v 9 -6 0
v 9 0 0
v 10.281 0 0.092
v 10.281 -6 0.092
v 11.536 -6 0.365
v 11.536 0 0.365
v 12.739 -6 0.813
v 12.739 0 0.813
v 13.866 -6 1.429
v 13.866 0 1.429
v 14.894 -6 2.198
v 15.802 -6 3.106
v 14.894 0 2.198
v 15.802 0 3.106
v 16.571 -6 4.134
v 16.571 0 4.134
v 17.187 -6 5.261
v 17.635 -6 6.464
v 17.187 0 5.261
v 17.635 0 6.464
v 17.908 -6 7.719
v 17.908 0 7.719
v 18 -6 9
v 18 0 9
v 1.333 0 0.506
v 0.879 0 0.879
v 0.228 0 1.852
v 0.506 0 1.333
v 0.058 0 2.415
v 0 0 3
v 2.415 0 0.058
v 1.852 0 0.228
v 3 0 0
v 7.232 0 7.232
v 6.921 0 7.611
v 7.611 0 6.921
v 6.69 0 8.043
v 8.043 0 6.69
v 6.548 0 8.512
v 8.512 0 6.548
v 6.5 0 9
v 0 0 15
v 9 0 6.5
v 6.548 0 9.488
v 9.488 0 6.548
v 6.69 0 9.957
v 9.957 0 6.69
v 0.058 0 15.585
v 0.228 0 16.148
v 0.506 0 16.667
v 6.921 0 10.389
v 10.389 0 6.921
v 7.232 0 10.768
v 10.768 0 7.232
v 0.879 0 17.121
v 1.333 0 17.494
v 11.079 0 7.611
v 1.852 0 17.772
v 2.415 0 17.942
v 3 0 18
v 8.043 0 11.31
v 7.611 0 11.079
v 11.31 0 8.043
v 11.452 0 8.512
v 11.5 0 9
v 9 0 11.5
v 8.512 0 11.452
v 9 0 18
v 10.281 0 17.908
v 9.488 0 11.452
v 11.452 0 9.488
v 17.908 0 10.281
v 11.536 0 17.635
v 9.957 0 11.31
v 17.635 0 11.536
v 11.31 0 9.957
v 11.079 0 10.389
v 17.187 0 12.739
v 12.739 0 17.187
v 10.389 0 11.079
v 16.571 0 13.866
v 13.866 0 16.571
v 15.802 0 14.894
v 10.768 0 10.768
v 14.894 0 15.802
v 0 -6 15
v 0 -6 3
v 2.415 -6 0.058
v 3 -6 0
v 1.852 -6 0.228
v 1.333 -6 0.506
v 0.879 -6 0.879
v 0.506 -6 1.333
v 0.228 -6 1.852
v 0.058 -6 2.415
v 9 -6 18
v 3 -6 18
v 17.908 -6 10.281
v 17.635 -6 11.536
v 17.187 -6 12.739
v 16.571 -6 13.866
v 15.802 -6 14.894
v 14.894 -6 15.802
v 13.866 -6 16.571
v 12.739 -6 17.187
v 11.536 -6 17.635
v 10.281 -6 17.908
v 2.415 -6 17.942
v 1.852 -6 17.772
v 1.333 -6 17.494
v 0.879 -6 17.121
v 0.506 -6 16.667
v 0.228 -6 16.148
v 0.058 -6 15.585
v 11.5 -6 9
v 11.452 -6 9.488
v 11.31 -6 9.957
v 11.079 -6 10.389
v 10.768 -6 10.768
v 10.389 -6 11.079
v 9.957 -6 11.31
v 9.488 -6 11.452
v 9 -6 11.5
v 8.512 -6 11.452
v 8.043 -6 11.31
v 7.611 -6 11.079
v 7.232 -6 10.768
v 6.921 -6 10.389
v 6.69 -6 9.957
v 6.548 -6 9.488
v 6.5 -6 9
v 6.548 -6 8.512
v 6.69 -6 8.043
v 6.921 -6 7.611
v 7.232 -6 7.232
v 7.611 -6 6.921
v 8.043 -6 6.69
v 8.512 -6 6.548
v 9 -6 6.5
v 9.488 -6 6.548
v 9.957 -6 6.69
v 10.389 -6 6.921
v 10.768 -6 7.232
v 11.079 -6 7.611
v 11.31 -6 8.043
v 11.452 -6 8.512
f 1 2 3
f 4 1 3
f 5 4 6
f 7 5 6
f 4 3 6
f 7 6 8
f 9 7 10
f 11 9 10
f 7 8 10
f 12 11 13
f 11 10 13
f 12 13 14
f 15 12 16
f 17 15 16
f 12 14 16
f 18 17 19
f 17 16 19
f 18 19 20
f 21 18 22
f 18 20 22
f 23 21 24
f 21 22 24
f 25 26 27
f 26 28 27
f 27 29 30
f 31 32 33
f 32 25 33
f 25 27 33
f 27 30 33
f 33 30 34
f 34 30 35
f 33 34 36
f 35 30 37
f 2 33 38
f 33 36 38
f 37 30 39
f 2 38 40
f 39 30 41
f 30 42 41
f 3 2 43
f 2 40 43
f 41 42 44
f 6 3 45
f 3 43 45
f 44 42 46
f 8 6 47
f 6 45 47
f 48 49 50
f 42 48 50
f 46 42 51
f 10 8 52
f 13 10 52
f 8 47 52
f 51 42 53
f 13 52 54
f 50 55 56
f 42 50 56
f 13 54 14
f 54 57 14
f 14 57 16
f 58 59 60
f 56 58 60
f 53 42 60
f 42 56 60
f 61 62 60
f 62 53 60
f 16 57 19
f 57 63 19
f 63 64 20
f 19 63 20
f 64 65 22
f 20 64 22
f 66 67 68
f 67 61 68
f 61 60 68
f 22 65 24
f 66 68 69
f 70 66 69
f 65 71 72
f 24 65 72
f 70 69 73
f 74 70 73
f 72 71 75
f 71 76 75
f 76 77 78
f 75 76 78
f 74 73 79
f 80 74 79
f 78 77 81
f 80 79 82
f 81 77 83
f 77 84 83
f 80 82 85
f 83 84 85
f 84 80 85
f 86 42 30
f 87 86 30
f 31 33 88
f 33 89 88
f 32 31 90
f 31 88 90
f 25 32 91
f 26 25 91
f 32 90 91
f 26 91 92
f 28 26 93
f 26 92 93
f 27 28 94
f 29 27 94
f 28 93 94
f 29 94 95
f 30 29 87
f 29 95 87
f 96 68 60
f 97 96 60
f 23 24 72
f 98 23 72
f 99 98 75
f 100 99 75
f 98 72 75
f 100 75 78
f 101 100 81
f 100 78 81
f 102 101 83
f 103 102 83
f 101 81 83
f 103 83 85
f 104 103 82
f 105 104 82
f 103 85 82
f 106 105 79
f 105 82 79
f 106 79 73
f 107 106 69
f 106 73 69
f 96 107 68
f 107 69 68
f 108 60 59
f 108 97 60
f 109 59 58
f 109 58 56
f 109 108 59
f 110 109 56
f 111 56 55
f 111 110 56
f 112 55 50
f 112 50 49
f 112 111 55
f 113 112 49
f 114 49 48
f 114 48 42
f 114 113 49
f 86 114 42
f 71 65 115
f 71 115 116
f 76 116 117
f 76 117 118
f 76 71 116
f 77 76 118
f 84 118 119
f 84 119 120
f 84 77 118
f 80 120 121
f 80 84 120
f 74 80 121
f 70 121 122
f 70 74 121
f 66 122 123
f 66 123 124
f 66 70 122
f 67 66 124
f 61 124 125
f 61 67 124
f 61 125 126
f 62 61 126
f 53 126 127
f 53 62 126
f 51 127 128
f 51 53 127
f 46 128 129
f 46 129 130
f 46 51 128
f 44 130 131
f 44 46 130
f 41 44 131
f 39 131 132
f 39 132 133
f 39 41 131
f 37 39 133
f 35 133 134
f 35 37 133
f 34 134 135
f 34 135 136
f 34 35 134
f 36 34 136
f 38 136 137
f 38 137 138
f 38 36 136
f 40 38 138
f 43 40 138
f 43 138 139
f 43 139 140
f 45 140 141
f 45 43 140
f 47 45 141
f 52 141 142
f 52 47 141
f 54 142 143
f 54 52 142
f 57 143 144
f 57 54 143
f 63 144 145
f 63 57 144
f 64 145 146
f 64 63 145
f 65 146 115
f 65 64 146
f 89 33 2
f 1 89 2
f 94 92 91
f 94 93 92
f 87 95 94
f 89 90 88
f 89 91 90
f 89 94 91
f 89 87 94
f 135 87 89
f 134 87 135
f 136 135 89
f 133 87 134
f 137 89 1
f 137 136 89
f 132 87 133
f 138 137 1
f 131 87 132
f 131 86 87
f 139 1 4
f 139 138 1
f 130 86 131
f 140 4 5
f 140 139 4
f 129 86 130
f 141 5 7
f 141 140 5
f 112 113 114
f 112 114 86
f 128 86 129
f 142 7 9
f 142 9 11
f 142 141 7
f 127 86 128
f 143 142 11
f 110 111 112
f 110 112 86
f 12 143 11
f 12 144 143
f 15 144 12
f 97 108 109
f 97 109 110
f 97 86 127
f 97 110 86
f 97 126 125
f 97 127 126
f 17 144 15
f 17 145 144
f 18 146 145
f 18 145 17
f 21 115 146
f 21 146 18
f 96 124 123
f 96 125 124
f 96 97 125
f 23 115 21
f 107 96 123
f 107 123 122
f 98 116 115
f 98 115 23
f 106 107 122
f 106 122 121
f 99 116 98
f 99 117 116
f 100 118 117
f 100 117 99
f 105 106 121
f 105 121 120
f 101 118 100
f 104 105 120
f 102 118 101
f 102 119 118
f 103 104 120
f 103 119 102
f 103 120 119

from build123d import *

# Parameters (mm, degrees)
F0_R     = 2.5
F1_DEPTH = 6
F2_R     = 3


with BuildPart() as f1:
    # F0 (on Front) → F1 (new body)
    with BuildSketch(Plane.XZ):
        with BuildLine():
            Line((0, 9), (0, 0))
            Line((0, 0), (9, 0))
            ThreePointArc((9, 0), (2.6360389693, 2.6360389693), (0, 9))
        make_face()
        with BuildLine():
            ThreePointArc((0, 9), (2.6360389693, 2.6360389693), (9, 0))
            ThreePointArc((9, 0), (15.3639610307, 2.6360389693), (18, 9))
            ThreePointArc((18, 9), (15.3639610307, 15.3639610307), (9, 18))
            ThreePointArc((9, 18), (2.6360389693, 15.3639610307), (0, 9))
        make_face()
        with Locations((9, 9)):
            Circle(F0_R, mode=Mode.SUBTRACT)
        with BuildLine():
            Line((0, 18), (0, 9))
            ThreePointArc((0, 9), (2.6360389693, 15.3639610307), (9, 18))
            Line((9, 18), (0, 18))
        make_face()
    extrude(amount=F1_DEPTH)

    # F2
    f2_edges = [f1.edges().sort_by_distance(p)[0] for p in [
        (0, -3, 18),
        (0, -3, 0),
    ]]
    fillet(f2_edges, radius=F2_R)


solid = f1.part
